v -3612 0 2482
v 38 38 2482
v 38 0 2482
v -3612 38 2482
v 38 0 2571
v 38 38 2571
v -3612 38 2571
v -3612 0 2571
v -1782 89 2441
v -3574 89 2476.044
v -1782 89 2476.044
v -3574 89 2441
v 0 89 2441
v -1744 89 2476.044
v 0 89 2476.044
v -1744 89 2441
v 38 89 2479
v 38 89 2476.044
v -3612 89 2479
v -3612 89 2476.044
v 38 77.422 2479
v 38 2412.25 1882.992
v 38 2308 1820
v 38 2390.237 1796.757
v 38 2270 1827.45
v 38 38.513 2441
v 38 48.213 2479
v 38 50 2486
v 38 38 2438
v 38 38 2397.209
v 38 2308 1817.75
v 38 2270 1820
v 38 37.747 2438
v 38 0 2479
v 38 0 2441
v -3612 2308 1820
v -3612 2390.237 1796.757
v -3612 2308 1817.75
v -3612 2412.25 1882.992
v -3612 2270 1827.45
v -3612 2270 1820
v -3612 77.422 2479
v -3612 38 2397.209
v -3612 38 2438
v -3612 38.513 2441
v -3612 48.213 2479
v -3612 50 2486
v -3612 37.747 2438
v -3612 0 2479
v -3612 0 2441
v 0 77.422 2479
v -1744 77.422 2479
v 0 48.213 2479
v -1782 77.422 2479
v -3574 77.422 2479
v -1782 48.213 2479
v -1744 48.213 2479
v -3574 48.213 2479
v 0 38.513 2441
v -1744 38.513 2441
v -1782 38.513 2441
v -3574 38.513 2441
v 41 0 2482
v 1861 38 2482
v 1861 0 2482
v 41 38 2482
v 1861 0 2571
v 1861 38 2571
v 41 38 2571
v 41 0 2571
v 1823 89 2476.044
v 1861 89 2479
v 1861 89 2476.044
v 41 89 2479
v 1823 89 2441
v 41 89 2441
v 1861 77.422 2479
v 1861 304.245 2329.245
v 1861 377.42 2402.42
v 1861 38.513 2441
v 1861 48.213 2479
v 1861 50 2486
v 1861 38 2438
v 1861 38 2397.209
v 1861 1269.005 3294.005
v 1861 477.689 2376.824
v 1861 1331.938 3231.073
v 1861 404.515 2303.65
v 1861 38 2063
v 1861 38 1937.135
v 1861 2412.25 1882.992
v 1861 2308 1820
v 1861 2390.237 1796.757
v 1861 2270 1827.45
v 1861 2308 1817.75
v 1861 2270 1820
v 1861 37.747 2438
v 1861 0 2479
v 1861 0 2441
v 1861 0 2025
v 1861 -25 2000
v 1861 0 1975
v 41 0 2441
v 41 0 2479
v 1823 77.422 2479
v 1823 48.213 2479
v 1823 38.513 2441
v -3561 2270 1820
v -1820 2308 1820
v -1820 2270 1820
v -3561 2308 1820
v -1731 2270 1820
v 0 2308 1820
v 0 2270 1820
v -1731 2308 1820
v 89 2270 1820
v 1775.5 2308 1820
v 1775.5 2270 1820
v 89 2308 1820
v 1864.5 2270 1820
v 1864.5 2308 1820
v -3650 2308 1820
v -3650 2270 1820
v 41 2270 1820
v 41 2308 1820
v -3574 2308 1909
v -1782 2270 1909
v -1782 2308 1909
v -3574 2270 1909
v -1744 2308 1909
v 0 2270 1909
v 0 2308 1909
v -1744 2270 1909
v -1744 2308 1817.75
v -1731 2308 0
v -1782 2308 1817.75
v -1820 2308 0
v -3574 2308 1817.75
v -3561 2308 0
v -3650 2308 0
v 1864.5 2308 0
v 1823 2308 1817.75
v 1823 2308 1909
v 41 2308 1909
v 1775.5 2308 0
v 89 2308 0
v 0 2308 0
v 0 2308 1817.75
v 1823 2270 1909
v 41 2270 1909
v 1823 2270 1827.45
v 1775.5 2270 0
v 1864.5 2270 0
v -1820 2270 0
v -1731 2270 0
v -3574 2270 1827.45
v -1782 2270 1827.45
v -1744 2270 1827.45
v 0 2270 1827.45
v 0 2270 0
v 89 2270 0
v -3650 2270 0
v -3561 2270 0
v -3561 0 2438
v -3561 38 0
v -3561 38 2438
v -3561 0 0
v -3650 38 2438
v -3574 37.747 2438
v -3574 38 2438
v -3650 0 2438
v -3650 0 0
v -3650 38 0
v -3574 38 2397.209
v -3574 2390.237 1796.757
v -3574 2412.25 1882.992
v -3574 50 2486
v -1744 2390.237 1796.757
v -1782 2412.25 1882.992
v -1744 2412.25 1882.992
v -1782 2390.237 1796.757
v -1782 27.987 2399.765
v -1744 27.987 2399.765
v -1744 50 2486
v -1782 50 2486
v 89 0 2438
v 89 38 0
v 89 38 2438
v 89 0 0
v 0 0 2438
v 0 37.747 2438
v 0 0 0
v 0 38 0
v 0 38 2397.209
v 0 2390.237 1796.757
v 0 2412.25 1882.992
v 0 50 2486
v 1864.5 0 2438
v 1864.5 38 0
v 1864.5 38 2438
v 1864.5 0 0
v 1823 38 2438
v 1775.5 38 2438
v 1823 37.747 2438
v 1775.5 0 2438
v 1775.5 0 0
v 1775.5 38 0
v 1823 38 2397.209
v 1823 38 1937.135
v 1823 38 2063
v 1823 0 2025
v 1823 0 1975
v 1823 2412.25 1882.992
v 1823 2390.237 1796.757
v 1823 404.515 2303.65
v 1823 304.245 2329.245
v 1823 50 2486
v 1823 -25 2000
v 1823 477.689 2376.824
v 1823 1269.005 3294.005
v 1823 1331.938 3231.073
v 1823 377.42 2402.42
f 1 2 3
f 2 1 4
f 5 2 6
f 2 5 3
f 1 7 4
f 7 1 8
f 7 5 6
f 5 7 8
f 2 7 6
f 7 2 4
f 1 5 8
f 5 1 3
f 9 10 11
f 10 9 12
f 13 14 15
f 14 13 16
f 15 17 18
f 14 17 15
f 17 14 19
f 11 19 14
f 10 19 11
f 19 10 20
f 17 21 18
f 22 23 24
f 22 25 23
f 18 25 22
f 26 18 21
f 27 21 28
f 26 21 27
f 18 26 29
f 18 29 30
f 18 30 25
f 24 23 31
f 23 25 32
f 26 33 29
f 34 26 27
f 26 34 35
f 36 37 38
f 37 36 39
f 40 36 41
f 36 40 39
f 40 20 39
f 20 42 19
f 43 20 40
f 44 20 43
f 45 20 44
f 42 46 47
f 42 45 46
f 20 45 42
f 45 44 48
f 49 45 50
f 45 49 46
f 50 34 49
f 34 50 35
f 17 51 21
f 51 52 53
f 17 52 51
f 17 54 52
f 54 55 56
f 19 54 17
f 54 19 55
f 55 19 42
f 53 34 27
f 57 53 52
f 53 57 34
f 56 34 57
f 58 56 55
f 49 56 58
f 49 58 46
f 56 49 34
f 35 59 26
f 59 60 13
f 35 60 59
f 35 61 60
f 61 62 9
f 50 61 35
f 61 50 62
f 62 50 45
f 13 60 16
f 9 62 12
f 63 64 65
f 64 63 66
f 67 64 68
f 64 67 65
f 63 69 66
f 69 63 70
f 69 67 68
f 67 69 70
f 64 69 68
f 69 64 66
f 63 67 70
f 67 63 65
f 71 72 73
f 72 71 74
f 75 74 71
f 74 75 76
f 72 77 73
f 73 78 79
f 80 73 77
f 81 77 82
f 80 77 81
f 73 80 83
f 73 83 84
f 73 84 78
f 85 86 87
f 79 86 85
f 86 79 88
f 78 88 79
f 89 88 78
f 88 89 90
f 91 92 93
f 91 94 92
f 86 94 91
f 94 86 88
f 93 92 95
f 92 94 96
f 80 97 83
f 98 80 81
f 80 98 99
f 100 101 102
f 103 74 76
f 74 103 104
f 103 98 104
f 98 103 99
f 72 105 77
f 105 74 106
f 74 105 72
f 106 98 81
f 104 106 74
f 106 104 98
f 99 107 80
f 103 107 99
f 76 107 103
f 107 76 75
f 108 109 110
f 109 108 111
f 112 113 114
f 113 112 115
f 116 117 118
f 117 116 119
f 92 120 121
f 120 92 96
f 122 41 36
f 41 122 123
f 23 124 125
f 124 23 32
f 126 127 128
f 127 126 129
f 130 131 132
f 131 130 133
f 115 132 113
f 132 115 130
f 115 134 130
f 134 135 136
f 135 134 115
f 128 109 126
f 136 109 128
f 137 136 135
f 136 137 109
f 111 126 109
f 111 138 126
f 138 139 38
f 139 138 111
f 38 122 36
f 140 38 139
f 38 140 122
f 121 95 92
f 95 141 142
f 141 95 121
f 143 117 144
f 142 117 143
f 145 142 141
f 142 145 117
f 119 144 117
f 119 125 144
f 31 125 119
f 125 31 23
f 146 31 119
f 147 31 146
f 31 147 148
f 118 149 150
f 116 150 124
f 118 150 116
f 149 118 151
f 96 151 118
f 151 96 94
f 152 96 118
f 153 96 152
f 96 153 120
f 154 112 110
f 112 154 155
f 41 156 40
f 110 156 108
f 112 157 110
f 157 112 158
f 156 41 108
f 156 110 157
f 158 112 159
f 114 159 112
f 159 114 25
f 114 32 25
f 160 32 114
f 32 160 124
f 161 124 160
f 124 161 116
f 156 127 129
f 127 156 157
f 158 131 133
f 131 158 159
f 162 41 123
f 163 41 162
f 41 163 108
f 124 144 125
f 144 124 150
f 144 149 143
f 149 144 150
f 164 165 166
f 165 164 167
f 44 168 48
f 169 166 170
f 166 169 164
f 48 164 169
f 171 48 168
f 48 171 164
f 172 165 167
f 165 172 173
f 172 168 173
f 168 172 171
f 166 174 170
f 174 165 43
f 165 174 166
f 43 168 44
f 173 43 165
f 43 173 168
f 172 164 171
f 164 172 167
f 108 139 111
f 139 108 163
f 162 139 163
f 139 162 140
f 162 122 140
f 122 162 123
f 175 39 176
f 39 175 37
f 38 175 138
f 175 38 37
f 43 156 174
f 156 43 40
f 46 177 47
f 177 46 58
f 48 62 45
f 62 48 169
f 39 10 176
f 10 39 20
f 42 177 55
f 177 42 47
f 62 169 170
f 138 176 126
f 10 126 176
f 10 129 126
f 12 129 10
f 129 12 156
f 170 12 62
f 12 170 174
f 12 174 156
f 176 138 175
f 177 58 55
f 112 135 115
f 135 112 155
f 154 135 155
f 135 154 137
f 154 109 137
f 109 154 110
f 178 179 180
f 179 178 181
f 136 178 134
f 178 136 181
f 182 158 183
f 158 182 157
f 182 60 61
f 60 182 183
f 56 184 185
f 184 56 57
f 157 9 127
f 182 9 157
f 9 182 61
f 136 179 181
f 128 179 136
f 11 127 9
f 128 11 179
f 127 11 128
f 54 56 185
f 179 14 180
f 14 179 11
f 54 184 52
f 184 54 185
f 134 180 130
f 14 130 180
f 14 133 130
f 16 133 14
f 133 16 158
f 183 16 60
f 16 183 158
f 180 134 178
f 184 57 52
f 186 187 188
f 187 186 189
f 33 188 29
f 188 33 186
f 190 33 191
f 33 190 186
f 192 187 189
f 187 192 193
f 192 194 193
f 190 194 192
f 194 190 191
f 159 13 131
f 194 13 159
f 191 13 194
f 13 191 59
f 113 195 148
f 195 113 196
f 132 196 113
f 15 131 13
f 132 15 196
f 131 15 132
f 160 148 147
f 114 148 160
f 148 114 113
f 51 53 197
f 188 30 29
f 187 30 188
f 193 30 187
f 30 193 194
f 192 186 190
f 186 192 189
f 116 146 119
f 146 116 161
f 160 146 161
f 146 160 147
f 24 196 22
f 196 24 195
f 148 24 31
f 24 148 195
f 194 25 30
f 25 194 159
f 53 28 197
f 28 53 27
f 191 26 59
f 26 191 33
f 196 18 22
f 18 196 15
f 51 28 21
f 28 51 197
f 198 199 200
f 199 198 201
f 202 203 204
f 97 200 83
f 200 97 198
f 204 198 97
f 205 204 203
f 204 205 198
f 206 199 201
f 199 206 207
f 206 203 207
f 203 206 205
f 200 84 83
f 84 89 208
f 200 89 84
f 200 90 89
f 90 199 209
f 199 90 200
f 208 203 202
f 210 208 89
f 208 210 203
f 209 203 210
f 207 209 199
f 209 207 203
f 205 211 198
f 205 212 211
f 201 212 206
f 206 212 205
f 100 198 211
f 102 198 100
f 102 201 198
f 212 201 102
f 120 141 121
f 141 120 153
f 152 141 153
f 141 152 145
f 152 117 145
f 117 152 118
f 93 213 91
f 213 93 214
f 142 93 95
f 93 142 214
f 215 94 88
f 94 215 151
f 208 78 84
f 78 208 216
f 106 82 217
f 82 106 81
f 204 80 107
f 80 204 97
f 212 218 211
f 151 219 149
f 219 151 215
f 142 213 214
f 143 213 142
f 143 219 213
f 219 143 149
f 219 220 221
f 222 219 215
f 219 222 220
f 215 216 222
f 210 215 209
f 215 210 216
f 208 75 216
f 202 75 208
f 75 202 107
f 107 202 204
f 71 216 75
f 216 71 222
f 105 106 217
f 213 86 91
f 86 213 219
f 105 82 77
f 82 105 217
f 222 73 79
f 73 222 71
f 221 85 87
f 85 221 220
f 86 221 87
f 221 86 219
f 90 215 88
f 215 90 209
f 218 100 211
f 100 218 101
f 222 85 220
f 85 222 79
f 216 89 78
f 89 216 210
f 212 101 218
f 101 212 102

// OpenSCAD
//
// ktROOF1
//
//


gap1 = 0.001;
gap2 = 0.002;



translate([-3650+38  , 0, 2438+89+38+6]) rotate([0, 90, 0]) 2x4x12f();
translate([-3650+38  , 0, 2438+3]) rotate([90, 0, 90]) 2x4x12f();
translate([      38+3, 0, 2438+89+38+6]) rotate([0, 90, 0]) 2x4x6f();
translate([      38+3, 0, 2438+3]) rotate([90, 0, 90]) 2x4x6f();
translate([-3650+38  , 2270, 1820+89]) rotate([0, 90, 0]) 2x4x12f();
translate([      38+3, 2270, 1820+89]) rotate([0, 90, 0]) 2x4x6f();


translate([-3650, 0, 0]) 2x4x8f();
translate([-3650, 2270, 0]) 2x4x6f();
translate([-3650+38*2, 50, 2438+38+10]) rotate([0, 104.32, 90]) 2x4(2438);

translate([-1820, 2270, 0]) 2x4x6f();
translate([-1820+38*2, 50, 2438+38+10]) rotate([0, 104.32, 90]) 2x4(2438);

2x4x8f();
translate([0, 2270, 0]) 2x4x6f();
translate([0+38, 50, 2438+38+10]) rotate([0, 104.32, 90]) 2x4(2438);

translate([1820-89/2, 0, 0]) 2x4x8f();
translate([1820-89/2, 2270, 0]) 2x4x6f();
translate([1820+(89-38-10), 50, 2438+38+10]) rotate([0, 104.32, 90]) 2x4(2438);
//#translate([1820+(89-38-10), 50+60, 2438+38+10+77]) rotate([0, 104.32, 90]) 2x4(2250);

#translate([1820+(89-38-10), -25, 2000]) rotate([0, 45, 90]) 2x4(1830);

module 2x4(L=1820){
    cube( [89, 38, L] );
}

module 2x4x6f(){
    cube( [89, 38, 1820] );
}

module 2x4x8f(){
    cube( [89, 38, 2438] );
}

module 2x4x12f(){
    cube( [89, 38, 3650] );
}

module 2x2(L=3050){
    cube( [38, 38, L] );
}

module 30x40(L=1820){
    cube( [30, 40, L] );
}
